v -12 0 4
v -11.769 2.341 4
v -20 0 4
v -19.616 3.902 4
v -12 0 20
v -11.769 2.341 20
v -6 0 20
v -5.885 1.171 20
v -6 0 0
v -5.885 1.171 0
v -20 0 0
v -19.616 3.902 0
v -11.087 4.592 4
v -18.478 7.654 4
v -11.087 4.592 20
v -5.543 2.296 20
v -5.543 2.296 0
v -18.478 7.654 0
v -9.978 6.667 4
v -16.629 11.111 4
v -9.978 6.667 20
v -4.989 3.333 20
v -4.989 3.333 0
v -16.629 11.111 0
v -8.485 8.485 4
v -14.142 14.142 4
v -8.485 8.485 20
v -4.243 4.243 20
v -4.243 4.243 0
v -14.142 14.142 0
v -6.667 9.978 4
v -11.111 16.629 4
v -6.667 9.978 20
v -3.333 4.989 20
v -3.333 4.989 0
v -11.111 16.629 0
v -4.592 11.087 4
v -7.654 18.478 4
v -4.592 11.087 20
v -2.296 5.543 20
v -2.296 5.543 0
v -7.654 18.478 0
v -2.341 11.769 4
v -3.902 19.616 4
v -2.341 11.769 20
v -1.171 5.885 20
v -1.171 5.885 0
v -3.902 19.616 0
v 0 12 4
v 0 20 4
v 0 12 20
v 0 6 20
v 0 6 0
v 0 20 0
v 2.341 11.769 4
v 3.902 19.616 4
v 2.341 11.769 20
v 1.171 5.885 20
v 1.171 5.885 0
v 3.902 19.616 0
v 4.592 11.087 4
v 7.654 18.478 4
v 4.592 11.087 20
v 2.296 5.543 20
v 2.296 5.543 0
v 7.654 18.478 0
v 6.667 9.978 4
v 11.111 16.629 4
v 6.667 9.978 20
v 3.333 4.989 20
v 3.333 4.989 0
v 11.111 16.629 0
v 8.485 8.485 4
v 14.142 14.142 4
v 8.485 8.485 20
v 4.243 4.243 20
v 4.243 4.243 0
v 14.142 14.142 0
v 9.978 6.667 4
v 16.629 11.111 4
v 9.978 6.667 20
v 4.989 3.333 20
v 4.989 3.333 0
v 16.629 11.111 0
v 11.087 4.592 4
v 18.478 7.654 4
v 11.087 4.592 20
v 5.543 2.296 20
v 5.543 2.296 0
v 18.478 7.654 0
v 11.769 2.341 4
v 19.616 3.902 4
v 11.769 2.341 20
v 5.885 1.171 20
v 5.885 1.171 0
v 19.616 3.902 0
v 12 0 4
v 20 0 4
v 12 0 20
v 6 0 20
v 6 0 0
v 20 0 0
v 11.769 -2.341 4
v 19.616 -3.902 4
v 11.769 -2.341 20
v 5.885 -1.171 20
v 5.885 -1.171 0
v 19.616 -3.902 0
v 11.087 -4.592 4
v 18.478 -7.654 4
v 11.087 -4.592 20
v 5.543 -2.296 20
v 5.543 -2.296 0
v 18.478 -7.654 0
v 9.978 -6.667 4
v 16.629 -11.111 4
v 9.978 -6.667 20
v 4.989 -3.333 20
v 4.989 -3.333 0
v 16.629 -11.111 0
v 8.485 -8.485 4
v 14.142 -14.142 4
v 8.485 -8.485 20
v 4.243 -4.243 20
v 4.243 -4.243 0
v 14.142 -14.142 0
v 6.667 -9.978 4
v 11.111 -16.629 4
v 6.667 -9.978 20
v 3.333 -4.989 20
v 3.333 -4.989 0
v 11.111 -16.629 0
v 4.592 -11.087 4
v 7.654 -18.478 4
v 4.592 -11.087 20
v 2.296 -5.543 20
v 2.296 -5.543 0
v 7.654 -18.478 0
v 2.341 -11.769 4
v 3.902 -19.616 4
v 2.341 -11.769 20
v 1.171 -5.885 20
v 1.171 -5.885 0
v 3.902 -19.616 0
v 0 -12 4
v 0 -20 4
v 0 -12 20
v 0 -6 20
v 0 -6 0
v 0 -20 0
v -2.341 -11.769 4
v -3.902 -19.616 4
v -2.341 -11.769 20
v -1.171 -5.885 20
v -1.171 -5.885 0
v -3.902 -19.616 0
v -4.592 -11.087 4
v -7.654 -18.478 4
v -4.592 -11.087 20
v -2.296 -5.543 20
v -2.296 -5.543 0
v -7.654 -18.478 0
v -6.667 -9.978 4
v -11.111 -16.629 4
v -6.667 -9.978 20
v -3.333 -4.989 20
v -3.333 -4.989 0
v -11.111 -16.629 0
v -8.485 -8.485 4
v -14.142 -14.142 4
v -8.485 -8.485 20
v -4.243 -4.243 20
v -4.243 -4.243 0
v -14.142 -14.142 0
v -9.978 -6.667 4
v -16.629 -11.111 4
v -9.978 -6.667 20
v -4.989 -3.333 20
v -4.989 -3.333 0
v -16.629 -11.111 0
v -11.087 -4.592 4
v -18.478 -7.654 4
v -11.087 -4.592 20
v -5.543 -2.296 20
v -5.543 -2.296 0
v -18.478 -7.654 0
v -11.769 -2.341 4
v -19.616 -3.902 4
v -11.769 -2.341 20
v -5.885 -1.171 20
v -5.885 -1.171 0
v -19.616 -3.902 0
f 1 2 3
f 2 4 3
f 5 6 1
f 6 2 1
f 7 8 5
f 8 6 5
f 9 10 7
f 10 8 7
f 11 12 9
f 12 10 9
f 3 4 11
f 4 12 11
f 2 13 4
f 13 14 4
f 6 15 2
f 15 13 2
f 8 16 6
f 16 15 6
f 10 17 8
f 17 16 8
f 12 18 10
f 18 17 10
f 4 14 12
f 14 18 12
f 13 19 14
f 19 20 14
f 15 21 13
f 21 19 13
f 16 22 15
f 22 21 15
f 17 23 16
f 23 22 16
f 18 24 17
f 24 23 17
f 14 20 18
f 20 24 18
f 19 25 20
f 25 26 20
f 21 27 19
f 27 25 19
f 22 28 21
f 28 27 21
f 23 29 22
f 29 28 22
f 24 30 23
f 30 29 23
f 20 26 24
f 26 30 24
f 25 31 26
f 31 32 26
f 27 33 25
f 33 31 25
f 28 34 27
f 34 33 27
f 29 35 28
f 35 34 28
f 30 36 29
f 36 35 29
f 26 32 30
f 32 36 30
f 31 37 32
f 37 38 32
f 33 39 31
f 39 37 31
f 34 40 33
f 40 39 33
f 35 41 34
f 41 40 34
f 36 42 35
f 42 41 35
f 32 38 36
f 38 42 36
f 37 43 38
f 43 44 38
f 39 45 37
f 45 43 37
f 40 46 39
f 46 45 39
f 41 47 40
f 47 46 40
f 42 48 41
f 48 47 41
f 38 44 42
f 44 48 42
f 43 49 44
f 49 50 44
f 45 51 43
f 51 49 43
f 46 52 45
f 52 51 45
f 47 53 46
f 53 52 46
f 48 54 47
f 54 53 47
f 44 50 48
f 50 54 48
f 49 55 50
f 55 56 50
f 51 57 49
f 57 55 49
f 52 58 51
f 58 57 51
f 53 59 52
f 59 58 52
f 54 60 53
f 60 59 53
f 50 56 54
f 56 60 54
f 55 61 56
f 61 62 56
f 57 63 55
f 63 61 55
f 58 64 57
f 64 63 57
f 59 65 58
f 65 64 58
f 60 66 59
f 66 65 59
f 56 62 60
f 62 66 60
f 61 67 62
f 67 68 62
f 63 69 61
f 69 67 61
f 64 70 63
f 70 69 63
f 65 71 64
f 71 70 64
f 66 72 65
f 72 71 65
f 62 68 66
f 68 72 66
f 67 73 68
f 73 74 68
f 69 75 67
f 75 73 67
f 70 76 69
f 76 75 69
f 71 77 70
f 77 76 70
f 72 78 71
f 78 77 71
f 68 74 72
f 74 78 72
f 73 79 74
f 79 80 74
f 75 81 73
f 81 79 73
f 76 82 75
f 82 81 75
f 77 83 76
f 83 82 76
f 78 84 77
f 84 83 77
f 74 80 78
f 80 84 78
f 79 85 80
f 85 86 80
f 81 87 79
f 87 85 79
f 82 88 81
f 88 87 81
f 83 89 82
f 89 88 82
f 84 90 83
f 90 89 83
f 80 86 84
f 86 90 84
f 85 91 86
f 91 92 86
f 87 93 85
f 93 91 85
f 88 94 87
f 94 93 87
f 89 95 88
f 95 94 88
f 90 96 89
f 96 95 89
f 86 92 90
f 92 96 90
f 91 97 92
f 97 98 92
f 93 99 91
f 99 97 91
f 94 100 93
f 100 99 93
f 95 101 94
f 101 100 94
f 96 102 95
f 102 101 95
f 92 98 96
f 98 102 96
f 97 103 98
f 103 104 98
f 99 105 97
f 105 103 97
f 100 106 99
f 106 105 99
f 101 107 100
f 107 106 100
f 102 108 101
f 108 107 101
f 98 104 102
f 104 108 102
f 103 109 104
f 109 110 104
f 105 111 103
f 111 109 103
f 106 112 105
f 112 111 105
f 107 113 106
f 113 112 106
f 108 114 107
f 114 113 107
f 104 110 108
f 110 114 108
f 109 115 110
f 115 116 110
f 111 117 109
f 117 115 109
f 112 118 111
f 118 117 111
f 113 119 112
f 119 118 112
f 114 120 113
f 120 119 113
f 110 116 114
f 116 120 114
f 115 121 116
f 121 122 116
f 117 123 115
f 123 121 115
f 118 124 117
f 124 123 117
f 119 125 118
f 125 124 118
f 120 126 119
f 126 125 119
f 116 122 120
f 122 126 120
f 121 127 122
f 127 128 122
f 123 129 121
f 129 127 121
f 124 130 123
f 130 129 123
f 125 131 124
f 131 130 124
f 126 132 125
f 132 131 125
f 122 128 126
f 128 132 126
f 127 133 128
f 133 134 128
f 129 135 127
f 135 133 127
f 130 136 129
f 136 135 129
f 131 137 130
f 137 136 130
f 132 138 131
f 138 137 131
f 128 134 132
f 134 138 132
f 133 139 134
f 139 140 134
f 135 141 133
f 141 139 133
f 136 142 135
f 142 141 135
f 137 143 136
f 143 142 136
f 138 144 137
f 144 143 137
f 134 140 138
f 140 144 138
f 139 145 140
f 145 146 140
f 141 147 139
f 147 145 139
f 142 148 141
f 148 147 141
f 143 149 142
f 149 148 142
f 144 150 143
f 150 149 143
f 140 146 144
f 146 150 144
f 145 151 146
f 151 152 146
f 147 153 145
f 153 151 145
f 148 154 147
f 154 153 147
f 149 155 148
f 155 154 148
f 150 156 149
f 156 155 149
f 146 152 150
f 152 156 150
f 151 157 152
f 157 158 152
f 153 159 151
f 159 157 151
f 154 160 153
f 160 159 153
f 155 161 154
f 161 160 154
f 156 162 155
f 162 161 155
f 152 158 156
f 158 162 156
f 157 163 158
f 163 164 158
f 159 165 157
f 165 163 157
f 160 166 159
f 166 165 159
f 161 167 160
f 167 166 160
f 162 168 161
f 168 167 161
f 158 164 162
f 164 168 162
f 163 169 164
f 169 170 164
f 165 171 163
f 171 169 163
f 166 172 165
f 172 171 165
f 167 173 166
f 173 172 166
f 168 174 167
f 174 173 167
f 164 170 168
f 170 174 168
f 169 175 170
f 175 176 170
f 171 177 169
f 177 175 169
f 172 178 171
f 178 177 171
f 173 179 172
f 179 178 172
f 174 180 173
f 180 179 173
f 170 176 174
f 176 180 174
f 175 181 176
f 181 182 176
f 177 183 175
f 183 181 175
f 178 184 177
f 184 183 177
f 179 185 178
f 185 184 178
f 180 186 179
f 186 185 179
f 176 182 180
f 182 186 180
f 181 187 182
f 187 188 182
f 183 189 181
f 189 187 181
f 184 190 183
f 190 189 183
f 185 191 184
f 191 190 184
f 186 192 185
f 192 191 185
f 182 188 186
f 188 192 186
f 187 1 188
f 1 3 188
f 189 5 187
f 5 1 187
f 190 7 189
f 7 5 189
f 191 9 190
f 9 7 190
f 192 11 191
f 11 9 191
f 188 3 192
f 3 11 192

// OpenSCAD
$fn = 32;

// ----------------------------------------------------------------------
// Revolved part: flanged bushing R20
// ----------------------------------------------------------------------

// --- parameters (mm) ---
bore_r = 6;               // bore radius
flange_r = 20;            // flange radius
flange_h = 4;             // flange thickness
sleeve_r = 12;            // sleeve radius
total_h = 20;             // overall height
revolve_angle = 360;      // revolve sweep, degrees

bore_d = 2 * bore_r;
flange_d = 2 * flange_r;
sleeve_d = 2 * sleeve_r;

profile = [[6, 0], [20, 0], [20, 4], [12, 4], [12, 20], [6, 20]];  // primary outline, 6 points, counter clockwise

// --- the one profile operation ---
rotate_extrude(angle = revolve_angle) polygon(points = profile);
